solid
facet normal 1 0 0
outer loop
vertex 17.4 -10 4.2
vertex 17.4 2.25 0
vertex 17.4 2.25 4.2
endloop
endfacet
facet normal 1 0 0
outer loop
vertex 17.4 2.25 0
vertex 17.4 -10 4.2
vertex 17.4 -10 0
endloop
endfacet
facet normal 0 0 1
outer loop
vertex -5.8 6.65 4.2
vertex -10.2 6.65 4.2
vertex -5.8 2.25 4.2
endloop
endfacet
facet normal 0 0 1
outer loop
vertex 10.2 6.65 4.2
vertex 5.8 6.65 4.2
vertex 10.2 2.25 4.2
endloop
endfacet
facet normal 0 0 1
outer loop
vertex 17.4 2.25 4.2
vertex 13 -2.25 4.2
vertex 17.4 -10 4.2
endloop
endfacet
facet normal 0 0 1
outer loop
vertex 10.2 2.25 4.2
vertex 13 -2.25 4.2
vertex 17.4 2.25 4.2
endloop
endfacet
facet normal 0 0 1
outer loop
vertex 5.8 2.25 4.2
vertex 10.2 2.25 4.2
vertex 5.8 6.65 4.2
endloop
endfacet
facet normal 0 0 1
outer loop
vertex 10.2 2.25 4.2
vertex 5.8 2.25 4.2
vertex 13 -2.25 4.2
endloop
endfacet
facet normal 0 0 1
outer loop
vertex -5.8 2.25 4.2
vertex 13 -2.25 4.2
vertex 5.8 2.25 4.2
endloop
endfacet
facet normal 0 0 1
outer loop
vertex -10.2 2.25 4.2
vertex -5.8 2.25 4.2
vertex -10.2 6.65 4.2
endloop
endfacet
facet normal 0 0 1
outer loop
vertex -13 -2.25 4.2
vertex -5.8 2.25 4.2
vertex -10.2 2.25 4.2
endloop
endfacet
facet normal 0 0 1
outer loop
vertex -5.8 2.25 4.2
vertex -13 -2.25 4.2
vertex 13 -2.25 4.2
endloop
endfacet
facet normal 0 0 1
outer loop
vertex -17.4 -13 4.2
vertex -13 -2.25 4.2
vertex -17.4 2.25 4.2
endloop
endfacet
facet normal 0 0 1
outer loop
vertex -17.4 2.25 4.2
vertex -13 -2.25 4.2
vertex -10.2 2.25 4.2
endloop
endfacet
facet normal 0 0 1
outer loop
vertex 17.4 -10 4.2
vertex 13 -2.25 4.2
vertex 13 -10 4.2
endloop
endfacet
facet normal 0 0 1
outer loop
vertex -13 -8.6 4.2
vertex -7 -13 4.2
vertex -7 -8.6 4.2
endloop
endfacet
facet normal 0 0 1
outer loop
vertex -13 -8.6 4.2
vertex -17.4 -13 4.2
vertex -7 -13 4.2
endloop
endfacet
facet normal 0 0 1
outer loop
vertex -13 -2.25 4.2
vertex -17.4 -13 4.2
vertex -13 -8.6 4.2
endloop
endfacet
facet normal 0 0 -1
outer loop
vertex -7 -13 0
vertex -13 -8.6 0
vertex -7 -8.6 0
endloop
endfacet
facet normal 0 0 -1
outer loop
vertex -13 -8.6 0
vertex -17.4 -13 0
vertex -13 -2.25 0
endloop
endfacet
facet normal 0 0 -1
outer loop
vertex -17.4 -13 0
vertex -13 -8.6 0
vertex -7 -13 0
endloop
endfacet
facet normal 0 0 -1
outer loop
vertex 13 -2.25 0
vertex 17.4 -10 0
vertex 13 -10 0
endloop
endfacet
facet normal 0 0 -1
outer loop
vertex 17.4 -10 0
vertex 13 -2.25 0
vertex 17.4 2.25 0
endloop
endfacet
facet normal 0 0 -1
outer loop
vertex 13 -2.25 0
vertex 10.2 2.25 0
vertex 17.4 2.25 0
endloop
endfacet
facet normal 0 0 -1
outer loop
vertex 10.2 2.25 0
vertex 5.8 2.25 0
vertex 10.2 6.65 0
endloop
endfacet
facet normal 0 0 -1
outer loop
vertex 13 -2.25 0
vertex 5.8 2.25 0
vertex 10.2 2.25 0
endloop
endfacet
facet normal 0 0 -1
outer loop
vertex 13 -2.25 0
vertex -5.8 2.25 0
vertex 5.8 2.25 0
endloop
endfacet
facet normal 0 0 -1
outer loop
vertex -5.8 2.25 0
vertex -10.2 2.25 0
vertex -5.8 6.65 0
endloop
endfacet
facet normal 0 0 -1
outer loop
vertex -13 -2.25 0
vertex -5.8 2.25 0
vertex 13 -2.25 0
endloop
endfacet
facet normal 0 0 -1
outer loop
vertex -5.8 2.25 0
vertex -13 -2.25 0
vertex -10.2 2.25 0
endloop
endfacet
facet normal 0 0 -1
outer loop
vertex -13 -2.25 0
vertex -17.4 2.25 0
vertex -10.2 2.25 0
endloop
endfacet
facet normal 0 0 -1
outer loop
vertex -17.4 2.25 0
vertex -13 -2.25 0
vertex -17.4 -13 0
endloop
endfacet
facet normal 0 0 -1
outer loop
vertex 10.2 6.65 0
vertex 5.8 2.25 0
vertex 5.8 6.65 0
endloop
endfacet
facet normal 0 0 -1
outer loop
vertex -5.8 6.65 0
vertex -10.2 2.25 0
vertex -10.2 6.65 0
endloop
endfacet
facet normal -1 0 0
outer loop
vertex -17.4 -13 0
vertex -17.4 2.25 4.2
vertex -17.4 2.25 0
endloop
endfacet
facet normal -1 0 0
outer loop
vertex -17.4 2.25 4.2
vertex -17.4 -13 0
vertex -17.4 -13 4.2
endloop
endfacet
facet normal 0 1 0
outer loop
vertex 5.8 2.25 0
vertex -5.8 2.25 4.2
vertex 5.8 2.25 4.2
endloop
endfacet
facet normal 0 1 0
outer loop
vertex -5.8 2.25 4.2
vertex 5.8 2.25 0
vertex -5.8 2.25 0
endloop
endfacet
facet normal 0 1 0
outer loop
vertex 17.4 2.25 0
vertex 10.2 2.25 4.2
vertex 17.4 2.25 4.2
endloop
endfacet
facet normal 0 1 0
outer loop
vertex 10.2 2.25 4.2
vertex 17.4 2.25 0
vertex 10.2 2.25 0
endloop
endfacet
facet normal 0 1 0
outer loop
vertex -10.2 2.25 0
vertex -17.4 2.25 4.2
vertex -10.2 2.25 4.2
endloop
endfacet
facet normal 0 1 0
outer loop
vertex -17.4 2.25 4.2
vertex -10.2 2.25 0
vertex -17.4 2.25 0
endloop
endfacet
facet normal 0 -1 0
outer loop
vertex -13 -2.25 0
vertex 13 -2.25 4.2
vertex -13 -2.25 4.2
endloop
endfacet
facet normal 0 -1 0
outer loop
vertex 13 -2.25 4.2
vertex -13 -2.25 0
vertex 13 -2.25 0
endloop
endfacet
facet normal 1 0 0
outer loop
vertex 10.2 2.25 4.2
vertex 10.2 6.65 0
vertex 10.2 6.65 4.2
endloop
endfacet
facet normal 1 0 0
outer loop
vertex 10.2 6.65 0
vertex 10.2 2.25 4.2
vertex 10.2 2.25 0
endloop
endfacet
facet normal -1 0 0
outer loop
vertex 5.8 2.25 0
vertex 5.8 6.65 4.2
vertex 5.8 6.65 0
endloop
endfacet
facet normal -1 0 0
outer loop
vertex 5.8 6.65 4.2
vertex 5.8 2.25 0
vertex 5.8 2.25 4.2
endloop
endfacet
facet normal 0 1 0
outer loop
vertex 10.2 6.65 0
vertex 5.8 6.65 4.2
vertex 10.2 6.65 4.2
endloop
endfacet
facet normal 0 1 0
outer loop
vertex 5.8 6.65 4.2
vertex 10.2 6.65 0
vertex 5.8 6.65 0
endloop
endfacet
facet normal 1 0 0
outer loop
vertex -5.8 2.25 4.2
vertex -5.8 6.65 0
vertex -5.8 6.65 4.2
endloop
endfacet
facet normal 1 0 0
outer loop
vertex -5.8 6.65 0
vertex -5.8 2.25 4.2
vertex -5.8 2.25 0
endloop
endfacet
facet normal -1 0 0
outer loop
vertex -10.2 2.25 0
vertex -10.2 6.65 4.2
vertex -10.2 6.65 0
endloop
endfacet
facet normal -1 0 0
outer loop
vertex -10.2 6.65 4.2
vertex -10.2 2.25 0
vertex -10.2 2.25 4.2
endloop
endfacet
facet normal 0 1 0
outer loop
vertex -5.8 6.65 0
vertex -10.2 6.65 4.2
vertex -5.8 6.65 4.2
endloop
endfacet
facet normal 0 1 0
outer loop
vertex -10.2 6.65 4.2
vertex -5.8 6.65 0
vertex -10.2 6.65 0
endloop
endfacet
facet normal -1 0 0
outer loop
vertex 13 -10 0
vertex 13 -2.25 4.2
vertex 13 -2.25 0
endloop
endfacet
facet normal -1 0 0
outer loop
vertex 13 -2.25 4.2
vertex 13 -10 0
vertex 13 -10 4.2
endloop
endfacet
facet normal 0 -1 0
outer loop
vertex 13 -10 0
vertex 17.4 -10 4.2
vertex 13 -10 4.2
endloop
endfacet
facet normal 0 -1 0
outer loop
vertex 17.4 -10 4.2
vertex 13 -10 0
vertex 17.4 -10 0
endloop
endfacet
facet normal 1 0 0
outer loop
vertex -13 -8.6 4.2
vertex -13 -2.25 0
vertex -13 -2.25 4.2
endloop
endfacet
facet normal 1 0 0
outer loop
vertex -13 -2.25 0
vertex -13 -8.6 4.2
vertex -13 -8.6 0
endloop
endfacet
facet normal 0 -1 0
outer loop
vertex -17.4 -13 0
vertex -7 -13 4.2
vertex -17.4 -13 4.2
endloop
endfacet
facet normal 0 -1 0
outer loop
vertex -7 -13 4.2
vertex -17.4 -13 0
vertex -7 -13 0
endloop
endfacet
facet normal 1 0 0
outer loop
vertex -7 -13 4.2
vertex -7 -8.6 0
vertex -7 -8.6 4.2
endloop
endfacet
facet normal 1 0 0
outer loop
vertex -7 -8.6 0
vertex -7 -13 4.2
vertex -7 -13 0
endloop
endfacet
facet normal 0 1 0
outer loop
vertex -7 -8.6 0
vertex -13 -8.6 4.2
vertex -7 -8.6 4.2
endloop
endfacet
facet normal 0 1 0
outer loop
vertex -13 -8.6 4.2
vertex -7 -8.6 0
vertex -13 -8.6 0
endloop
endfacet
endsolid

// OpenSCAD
length = 34.8; // Length of the rectangle
width = 4.5; // Width of the rectangle
height = 4.2; // Height of the rectangle

// Parameters for the cubes
cube_side = 4.4; // Side length of each cube
cube_distance_center = 8; // Distance from the center of the rectangle to the center of each cube
cube_gap = 16; // Distance between the centers of the two cubes

// Create the base rectangle
translate([-length/2, -width/2, 0])
    cube([length, width, height]);

// Create the first cube
translate([cube_distance_center - cube_side/2, width/2, 0])
    cube([cube_side, cube_side, height]);

// Create the second cube
translate([-cube_distance_center - cube_side/2, width/2, 0])
    cube([cube_side, cube_side, height]);
    
translate([13, -10, 0])
    cube([cube_side, 10, height]);
  
translate([-17.4, -13, 0])
    cube([cube_side, 11, height]);

translate([-13, -13, 0])
    cube([6, cube_side, height]);
